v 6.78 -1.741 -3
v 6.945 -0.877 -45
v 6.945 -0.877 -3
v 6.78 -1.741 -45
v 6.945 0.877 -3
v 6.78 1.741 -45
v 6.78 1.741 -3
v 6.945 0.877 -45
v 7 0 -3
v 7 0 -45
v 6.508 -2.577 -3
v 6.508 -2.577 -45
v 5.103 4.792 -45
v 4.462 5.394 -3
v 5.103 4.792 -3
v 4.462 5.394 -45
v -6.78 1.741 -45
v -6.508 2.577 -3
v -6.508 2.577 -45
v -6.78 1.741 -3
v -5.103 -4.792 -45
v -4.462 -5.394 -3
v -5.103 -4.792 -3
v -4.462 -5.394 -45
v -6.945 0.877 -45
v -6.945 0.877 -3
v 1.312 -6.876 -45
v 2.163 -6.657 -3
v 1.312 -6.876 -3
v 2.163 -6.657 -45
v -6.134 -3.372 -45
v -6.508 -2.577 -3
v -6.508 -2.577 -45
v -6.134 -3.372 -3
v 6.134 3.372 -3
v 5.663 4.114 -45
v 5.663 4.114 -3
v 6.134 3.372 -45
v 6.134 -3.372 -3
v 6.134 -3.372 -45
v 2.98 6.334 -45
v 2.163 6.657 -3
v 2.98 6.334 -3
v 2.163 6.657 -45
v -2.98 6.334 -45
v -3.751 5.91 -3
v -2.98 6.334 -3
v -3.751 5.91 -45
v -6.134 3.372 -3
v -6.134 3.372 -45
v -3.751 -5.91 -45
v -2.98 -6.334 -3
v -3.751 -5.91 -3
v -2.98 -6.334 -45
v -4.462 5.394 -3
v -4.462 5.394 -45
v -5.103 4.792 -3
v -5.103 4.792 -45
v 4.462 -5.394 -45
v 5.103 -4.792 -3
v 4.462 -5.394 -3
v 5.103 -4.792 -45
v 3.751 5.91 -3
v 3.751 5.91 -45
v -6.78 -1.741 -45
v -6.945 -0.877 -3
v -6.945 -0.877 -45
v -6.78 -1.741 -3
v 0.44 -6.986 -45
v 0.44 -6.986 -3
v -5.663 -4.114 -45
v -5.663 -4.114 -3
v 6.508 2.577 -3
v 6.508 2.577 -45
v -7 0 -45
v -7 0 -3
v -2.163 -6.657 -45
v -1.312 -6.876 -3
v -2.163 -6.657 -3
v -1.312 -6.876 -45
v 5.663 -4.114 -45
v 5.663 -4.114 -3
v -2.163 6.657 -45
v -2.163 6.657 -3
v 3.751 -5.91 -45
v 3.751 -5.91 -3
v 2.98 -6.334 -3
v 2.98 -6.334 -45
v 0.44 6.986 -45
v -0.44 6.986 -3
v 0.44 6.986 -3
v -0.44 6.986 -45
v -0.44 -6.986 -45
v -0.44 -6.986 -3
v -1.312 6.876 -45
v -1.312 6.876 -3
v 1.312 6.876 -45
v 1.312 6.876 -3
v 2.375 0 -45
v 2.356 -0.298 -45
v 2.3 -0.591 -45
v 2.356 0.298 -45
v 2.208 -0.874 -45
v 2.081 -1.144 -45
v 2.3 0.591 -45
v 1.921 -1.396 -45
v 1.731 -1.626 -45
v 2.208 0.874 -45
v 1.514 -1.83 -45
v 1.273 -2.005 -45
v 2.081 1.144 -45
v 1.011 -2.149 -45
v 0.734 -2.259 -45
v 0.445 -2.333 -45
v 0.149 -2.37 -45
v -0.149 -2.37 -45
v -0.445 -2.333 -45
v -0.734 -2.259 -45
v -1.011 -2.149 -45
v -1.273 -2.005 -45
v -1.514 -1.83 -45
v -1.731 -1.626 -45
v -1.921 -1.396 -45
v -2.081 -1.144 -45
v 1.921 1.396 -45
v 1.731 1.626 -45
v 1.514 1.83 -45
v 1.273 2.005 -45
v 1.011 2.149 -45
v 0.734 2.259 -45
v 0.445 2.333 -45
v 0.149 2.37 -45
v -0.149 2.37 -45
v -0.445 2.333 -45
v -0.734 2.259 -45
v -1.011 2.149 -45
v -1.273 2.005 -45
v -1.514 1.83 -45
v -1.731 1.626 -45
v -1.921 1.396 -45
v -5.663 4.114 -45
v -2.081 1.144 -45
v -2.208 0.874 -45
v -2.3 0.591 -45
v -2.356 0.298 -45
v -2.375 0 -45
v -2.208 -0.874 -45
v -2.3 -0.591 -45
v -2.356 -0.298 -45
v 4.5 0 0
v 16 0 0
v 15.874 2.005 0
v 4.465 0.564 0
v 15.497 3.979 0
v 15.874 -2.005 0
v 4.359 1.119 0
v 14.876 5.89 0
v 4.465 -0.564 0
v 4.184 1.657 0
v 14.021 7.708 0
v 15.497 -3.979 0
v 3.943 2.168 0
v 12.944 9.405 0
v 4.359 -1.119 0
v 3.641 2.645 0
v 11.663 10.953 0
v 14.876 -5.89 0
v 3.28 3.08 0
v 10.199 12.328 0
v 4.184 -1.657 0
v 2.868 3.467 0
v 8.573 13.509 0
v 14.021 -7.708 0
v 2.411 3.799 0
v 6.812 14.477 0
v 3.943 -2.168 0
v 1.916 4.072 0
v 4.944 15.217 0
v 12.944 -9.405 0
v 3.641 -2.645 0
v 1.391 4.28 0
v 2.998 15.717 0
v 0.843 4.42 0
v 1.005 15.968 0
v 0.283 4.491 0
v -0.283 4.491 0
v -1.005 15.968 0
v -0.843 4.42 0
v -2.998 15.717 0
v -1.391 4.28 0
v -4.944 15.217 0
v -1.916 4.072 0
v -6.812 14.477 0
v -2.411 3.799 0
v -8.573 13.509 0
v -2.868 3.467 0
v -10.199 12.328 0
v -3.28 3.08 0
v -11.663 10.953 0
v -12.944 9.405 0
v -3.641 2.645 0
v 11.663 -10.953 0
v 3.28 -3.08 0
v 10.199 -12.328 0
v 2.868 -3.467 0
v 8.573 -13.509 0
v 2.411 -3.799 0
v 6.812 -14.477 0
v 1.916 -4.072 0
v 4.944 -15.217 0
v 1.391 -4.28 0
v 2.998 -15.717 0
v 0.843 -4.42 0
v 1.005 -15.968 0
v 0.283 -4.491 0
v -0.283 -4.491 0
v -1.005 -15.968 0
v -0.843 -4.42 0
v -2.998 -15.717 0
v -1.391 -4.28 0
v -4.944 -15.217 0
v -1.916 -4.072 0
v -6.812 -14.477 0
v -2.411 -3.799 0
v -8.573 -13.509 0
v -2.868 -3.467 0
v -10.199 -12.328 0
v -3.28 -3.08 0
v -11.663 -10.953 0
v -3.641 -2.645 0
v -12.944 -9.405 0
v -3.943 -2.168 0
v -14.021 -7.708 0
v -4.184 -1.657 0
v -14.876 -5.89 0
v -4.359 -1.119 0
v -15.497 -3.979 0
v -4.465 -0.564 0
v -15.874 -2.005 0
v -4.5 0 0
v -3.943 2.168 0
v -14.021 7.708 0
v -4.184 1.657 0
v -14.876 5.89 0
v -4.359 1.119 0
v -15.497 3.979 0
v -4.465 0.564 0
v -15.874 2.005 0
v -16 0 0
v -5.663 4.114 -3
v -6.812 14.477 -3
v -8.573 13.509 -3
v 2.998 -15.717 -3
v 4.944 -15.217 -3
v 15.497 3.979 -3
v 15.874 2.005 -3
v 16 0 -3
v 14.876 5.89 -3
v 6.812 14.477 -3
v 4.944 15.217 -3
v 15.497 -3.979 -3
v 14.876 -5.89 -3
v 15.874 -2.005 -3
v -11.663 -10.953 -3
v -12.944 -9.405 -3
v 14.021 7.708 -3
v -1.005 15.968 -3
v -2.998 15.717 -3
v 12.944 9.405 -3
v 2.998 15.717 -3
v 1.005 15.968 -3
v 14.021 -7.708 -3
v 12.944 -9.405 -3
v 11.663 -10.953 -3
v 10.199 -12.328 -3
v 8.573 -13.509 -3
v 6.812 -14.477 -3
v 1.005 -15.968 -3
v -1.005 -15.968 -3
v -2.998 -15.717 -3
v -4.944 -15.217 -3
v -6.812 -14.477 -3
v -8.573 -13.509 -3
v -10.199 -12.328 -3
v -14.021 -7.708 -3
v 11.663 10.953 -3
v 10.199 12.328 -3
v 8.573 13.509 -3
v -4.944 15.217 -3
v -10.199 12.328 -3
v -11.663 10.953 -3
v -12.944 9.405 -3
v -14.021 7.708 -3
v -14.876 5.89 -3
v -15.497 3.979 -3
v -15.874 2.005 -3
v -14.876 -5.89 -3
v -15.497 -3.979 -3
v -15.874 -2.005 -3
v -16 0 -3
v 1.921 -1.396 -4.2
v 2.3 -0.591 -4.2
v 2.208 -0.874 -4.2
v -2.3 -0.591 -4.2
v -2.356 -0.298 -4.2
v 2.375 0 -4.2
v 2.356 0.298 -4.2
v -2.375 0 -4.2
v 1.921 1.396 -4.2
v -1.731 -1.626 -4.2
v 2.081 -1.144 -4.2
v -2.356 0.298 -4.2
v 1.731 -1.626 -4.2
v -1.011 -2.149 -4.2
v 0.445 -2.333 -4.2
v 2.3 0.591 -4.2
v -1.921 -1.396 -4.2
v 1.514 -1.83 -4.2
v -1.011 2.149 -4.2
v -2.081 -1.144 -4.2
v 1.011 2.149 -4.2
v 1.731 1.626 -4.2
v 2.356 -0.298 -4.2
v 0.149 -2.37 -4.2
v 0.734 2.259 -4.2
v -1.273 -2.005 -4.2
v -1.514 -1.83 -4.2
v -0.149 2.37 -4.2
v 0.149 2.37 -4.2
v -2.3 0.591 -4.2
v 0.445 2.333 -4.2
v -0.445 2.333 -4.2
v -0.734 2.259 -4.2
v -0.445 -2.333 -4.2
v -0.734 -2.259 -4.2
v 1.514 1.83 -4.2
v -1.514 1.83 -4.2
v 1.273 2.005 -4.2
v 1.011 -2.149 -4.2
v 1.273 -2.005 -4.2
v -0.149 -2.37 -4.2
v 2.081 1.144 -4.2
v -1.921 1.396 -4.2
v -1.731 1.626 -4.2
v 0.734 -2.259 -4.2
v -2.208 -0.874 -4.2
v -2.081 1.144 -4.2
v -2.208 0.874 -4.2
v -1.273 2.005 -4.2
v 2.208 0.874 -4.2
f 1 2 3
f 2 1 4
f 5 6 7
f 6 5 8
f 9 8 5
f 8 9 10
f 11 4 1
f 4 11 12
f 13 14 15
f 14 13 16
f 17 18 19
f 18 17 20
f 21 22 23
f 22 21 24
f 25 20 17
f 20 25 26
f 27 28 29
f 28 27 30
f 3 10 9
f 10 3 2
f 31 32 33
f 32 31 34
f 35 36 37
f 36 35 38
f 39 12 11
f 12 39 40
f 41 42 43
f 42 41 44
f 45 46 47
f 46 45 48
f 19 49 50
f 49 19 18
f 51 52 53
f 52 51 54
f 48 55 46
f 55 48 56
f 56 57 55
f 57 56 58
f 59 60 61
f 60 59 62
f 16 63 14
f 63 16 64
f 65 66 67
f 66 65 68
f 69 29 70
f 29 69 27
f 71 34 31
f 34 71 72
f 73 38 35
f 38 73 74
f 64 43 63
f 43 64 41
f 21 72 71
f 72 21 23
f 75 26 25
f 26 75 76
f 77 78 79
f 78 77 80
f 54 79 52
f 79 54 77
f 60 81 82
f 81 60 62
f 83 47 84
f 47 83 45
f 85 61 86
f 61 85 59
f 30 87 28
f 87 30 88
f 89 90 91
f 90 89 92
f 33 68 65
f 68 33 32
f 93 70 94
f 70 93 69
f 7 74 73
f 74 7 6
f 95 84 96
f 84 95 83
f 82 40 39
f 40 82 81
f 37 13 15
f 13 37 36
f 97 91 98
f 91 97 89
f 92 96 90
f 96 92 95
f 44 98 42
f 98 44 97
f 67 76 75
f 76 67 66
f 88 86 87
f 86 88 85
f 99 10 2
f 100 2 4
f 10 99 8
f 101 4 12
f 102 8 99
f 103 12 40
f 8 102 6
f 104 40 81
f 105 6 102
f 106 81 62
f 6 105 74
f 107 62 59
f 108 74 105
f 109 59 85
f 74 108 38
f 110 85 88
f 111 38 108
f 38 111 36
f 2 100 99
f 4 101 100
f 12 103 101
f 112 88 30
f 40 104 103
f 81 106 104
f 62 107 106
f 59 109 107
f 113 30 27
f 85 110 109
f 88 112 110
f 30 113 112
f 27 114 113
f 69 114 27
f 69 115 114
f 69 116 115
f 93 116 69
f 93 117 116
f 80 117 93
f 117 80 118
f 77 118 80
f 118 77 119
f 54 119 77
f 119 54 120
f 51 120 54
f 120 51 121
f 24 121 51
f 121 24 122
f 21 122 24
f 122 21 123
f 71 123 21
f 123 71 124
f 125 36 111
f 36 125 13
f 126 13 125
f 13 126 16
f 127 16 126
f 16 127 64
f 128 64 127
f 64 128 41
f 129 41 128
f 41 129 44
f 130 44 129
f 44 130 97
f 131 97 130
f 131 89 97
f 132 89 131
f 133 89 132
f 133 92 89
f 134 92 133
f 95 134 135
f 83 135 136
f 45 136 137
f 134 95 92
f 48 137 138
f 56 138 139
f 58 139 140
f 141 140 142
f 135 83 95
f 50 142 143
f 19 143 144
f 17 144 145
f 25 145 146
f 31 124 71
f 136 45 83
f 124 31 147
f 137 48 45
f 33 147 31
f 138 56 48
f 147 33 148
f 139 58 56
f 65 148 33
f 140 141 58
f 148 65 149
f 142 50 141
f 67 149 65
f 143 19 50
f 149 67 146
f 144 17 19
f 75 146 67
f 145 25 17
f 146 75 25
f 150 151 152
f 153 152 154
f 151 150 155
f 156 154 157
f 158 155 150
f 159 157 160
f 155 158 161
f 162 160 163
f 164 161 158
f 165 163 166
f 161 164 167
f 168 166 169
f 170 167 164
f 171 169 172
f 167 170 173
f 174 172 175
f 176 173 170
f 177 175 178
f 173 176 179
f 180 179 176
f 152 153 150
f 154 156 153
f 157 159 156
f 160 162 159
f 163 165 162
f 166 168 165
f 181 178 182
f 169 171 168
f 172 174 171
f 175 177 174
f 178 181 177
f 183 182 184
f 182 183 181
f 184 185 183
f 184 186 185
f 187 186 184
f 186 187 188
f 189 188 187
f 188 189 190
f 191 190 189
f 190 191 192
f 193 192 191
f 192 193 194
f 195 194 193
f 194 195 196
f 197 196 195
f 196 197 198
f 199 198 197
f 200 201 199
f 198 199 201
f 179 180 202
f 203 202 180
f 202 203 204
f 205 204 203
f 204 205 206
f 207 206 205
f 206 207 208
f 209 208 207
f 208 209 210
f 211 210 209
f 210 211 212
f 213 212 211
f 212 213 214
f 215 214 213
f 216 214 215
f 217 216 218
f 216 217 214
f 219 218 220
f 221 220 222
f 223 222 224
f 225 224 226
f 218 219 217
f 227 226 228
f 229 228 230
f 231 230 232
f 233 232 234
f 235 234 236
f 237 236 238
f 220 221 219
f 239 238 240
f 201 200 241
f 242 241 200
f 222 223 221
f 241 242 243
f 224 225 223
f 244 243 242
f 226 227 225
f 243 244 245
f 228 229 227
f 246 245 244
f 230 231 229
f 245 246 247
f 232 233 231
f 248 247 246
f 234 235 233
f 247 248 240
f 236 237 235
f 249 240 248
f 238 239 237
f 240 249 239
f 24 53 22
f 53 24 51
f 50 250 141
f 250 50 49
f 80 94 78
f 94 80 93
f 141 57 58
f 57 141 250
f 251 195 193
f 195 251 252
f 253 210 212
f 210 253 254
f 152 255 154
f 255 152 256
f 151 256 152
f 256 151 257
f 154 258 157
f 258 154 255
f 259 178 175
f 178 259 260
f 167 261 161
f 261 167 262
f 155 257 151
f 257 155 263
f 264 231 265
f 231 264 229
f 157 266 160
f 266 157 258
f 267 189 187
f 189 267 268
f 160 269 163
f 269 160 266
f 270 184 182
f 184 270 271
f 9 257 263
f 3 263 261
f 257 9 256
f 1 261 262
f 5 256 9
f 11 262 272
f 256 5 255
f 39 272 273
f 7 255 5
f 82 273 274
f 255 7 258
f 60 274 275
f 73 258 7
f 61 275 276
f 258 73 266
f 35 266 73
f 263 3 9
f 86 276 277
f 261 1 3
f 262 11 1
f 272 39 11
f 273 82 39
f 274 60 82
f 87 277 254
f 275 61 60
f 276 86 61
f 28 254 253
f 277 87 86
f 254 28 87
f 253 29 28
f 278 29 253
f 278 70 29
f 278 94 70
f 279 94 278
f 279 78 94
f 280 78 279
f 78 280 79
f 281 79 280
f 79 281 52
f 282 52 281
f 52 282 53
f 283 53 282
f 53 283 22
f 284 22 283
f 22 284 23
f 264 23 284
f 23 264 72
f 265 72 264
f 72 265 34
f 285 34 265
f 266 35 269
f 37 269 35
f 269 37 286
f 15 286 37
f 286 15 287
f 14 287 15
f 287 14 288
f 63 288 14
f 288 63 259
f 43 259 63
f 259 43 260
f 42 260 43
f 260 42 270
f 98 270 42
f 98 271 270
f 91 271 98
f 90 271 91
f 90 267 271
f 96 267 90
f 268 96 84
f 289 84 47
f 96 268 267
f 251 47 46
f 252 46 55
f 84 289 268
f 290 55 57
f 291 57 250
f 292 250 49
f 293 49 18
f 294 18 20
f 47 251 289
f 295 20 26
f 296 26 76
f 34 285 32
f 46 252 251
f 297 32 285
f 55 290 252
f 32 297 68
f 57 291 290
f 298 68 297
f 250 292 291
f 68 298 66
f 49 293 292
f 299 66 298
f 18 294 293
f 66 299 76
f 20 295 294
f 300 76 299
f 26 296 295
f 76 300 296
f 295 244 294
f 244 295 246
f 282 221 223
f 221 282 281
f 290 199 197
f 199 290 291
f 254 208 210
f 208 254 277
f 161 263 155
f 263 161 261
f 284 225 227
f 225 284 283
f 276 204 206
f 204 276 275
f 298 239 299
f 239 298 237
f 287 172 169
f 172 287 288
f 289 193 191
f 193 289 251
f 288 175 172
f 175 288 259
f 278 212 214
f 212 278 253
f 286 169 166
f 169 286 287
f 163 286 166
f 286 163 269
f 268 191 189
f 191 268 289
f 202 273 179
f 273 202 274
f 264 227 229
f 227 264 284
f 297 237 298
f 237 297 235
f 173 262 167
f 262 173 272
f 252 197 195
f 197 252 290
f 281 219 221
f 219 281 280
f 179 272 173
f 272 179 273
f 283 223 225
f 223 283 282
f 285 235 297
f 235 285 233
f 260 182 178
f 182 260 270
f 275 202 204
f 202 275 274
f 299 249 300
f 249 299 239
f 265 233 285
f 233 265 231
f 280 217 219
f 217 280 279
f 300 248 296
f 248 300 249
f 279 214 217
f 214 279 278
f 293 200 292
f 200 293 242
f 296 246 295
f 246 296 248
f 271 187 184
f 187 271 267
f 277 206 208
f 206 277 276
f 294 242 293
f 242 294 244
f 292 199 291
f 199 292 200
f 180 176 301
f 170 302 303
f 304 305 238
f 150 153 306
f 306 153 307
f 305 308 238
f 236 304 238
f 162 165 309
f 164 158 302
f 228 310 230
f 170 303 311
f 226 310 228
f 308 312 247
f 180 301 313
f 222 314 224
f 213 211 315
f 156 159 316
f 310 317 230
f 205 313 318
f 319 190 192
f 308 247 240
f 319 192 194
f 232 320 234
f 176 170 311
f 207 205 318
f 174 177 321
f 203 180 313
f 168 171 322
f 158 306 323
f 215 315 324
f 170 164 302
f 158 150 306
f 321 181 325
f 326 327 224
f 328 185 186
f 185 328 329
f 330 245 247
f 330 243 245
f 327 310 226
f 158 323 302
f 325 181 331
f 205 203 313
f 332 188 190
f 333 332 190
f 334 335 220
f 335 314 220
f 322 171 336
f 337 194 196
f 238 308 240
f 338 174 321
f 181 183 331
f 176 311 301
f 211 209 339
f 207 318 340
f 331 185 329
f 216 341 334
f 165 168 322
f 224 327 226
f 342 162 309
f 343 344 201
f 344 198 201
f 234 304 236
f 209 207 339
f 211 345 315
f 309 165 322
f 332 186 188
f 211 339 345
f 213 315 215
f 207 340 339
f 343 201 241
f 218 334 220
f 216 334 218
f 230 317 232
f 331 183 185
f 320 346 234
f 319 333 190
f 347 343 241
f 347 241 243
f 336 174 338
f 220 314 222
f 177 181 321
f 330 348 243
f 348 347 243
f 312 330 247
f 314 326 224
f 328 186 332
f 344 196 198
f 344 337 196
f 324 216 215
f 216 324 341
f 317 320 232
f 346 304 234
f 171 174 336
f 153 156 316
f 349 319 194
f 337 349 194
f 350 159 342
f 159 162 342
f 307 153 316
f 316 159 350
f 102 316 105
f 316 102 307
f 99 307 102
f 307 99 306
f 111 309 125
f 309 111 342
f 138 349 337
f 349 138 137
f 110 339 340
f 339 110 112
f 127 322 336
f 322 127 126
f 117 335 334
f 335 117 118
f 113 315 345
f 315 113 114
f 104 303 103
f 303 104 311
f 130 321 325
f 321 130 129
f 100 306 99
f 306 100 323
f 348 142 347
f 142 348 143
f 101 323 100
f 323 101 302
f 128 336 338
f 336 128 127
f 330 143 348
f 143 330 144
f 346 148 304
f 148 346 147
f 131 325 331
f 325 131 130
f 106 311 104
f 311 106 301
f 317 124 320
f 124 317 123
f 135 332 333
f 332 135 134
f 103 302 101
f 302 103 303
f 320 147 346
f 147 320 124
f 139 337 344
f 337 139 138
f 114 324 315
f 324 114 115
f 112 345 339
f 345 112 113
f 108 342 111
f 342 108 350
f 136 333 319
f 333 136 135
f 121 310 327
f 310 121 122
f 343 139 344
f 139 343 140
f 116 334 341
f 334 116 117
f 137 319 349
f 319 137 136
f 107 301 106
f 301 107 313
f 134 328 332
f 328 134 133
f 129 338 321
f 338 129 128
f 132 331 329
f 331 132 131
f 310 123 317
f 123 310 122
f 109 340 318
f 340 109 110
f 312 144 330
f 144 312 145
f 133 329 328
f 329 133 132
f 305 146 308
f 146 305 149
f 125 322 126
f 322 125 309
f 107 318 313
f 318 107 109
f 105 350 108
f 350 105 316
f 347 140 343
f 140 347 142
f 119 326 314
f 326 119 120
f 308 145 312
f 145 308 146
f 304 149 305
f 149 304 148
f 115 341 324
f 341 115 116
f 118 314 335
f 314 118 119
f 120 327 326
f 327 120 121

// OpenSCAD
$fn = 50;


difference() {
	union() {
		translate(v = [0, 0, -45.0000000000]) {
			cylinder(h = 45, r = 7.0000000000);
		}
		translate(v = [0, 0, -3.0000000000]) {
			cylinder(h = 3, r = 16.0000000000);
		}
	}
	union() {
		translate(v = [0, 0, 0]) {
			rotate(a = [0, 0, 0]) {
				difference() {
					union() {
						#translate(v = [0, 0, -45.0000000000]) {
							cylinder(h = 45, r = 2.2500000000);
						}
						#translate(v = [0, 0, -4.2000000000]) {
							cylinder(h = 4.2000000000, r1 = 2.3750000000, r2 = 4.5000000000);
						}
						#translate(v = [0, 0, -45.0000000000]) {
							cylinder(h = 45, r = 2.3750000000);
						}
						#translate(v = [0, 0, -45.0000000000]) {
							cylinder(h = 45, r = 2.2500000000);
						}
					}
					union();
				}
			}
		}
	}
}
